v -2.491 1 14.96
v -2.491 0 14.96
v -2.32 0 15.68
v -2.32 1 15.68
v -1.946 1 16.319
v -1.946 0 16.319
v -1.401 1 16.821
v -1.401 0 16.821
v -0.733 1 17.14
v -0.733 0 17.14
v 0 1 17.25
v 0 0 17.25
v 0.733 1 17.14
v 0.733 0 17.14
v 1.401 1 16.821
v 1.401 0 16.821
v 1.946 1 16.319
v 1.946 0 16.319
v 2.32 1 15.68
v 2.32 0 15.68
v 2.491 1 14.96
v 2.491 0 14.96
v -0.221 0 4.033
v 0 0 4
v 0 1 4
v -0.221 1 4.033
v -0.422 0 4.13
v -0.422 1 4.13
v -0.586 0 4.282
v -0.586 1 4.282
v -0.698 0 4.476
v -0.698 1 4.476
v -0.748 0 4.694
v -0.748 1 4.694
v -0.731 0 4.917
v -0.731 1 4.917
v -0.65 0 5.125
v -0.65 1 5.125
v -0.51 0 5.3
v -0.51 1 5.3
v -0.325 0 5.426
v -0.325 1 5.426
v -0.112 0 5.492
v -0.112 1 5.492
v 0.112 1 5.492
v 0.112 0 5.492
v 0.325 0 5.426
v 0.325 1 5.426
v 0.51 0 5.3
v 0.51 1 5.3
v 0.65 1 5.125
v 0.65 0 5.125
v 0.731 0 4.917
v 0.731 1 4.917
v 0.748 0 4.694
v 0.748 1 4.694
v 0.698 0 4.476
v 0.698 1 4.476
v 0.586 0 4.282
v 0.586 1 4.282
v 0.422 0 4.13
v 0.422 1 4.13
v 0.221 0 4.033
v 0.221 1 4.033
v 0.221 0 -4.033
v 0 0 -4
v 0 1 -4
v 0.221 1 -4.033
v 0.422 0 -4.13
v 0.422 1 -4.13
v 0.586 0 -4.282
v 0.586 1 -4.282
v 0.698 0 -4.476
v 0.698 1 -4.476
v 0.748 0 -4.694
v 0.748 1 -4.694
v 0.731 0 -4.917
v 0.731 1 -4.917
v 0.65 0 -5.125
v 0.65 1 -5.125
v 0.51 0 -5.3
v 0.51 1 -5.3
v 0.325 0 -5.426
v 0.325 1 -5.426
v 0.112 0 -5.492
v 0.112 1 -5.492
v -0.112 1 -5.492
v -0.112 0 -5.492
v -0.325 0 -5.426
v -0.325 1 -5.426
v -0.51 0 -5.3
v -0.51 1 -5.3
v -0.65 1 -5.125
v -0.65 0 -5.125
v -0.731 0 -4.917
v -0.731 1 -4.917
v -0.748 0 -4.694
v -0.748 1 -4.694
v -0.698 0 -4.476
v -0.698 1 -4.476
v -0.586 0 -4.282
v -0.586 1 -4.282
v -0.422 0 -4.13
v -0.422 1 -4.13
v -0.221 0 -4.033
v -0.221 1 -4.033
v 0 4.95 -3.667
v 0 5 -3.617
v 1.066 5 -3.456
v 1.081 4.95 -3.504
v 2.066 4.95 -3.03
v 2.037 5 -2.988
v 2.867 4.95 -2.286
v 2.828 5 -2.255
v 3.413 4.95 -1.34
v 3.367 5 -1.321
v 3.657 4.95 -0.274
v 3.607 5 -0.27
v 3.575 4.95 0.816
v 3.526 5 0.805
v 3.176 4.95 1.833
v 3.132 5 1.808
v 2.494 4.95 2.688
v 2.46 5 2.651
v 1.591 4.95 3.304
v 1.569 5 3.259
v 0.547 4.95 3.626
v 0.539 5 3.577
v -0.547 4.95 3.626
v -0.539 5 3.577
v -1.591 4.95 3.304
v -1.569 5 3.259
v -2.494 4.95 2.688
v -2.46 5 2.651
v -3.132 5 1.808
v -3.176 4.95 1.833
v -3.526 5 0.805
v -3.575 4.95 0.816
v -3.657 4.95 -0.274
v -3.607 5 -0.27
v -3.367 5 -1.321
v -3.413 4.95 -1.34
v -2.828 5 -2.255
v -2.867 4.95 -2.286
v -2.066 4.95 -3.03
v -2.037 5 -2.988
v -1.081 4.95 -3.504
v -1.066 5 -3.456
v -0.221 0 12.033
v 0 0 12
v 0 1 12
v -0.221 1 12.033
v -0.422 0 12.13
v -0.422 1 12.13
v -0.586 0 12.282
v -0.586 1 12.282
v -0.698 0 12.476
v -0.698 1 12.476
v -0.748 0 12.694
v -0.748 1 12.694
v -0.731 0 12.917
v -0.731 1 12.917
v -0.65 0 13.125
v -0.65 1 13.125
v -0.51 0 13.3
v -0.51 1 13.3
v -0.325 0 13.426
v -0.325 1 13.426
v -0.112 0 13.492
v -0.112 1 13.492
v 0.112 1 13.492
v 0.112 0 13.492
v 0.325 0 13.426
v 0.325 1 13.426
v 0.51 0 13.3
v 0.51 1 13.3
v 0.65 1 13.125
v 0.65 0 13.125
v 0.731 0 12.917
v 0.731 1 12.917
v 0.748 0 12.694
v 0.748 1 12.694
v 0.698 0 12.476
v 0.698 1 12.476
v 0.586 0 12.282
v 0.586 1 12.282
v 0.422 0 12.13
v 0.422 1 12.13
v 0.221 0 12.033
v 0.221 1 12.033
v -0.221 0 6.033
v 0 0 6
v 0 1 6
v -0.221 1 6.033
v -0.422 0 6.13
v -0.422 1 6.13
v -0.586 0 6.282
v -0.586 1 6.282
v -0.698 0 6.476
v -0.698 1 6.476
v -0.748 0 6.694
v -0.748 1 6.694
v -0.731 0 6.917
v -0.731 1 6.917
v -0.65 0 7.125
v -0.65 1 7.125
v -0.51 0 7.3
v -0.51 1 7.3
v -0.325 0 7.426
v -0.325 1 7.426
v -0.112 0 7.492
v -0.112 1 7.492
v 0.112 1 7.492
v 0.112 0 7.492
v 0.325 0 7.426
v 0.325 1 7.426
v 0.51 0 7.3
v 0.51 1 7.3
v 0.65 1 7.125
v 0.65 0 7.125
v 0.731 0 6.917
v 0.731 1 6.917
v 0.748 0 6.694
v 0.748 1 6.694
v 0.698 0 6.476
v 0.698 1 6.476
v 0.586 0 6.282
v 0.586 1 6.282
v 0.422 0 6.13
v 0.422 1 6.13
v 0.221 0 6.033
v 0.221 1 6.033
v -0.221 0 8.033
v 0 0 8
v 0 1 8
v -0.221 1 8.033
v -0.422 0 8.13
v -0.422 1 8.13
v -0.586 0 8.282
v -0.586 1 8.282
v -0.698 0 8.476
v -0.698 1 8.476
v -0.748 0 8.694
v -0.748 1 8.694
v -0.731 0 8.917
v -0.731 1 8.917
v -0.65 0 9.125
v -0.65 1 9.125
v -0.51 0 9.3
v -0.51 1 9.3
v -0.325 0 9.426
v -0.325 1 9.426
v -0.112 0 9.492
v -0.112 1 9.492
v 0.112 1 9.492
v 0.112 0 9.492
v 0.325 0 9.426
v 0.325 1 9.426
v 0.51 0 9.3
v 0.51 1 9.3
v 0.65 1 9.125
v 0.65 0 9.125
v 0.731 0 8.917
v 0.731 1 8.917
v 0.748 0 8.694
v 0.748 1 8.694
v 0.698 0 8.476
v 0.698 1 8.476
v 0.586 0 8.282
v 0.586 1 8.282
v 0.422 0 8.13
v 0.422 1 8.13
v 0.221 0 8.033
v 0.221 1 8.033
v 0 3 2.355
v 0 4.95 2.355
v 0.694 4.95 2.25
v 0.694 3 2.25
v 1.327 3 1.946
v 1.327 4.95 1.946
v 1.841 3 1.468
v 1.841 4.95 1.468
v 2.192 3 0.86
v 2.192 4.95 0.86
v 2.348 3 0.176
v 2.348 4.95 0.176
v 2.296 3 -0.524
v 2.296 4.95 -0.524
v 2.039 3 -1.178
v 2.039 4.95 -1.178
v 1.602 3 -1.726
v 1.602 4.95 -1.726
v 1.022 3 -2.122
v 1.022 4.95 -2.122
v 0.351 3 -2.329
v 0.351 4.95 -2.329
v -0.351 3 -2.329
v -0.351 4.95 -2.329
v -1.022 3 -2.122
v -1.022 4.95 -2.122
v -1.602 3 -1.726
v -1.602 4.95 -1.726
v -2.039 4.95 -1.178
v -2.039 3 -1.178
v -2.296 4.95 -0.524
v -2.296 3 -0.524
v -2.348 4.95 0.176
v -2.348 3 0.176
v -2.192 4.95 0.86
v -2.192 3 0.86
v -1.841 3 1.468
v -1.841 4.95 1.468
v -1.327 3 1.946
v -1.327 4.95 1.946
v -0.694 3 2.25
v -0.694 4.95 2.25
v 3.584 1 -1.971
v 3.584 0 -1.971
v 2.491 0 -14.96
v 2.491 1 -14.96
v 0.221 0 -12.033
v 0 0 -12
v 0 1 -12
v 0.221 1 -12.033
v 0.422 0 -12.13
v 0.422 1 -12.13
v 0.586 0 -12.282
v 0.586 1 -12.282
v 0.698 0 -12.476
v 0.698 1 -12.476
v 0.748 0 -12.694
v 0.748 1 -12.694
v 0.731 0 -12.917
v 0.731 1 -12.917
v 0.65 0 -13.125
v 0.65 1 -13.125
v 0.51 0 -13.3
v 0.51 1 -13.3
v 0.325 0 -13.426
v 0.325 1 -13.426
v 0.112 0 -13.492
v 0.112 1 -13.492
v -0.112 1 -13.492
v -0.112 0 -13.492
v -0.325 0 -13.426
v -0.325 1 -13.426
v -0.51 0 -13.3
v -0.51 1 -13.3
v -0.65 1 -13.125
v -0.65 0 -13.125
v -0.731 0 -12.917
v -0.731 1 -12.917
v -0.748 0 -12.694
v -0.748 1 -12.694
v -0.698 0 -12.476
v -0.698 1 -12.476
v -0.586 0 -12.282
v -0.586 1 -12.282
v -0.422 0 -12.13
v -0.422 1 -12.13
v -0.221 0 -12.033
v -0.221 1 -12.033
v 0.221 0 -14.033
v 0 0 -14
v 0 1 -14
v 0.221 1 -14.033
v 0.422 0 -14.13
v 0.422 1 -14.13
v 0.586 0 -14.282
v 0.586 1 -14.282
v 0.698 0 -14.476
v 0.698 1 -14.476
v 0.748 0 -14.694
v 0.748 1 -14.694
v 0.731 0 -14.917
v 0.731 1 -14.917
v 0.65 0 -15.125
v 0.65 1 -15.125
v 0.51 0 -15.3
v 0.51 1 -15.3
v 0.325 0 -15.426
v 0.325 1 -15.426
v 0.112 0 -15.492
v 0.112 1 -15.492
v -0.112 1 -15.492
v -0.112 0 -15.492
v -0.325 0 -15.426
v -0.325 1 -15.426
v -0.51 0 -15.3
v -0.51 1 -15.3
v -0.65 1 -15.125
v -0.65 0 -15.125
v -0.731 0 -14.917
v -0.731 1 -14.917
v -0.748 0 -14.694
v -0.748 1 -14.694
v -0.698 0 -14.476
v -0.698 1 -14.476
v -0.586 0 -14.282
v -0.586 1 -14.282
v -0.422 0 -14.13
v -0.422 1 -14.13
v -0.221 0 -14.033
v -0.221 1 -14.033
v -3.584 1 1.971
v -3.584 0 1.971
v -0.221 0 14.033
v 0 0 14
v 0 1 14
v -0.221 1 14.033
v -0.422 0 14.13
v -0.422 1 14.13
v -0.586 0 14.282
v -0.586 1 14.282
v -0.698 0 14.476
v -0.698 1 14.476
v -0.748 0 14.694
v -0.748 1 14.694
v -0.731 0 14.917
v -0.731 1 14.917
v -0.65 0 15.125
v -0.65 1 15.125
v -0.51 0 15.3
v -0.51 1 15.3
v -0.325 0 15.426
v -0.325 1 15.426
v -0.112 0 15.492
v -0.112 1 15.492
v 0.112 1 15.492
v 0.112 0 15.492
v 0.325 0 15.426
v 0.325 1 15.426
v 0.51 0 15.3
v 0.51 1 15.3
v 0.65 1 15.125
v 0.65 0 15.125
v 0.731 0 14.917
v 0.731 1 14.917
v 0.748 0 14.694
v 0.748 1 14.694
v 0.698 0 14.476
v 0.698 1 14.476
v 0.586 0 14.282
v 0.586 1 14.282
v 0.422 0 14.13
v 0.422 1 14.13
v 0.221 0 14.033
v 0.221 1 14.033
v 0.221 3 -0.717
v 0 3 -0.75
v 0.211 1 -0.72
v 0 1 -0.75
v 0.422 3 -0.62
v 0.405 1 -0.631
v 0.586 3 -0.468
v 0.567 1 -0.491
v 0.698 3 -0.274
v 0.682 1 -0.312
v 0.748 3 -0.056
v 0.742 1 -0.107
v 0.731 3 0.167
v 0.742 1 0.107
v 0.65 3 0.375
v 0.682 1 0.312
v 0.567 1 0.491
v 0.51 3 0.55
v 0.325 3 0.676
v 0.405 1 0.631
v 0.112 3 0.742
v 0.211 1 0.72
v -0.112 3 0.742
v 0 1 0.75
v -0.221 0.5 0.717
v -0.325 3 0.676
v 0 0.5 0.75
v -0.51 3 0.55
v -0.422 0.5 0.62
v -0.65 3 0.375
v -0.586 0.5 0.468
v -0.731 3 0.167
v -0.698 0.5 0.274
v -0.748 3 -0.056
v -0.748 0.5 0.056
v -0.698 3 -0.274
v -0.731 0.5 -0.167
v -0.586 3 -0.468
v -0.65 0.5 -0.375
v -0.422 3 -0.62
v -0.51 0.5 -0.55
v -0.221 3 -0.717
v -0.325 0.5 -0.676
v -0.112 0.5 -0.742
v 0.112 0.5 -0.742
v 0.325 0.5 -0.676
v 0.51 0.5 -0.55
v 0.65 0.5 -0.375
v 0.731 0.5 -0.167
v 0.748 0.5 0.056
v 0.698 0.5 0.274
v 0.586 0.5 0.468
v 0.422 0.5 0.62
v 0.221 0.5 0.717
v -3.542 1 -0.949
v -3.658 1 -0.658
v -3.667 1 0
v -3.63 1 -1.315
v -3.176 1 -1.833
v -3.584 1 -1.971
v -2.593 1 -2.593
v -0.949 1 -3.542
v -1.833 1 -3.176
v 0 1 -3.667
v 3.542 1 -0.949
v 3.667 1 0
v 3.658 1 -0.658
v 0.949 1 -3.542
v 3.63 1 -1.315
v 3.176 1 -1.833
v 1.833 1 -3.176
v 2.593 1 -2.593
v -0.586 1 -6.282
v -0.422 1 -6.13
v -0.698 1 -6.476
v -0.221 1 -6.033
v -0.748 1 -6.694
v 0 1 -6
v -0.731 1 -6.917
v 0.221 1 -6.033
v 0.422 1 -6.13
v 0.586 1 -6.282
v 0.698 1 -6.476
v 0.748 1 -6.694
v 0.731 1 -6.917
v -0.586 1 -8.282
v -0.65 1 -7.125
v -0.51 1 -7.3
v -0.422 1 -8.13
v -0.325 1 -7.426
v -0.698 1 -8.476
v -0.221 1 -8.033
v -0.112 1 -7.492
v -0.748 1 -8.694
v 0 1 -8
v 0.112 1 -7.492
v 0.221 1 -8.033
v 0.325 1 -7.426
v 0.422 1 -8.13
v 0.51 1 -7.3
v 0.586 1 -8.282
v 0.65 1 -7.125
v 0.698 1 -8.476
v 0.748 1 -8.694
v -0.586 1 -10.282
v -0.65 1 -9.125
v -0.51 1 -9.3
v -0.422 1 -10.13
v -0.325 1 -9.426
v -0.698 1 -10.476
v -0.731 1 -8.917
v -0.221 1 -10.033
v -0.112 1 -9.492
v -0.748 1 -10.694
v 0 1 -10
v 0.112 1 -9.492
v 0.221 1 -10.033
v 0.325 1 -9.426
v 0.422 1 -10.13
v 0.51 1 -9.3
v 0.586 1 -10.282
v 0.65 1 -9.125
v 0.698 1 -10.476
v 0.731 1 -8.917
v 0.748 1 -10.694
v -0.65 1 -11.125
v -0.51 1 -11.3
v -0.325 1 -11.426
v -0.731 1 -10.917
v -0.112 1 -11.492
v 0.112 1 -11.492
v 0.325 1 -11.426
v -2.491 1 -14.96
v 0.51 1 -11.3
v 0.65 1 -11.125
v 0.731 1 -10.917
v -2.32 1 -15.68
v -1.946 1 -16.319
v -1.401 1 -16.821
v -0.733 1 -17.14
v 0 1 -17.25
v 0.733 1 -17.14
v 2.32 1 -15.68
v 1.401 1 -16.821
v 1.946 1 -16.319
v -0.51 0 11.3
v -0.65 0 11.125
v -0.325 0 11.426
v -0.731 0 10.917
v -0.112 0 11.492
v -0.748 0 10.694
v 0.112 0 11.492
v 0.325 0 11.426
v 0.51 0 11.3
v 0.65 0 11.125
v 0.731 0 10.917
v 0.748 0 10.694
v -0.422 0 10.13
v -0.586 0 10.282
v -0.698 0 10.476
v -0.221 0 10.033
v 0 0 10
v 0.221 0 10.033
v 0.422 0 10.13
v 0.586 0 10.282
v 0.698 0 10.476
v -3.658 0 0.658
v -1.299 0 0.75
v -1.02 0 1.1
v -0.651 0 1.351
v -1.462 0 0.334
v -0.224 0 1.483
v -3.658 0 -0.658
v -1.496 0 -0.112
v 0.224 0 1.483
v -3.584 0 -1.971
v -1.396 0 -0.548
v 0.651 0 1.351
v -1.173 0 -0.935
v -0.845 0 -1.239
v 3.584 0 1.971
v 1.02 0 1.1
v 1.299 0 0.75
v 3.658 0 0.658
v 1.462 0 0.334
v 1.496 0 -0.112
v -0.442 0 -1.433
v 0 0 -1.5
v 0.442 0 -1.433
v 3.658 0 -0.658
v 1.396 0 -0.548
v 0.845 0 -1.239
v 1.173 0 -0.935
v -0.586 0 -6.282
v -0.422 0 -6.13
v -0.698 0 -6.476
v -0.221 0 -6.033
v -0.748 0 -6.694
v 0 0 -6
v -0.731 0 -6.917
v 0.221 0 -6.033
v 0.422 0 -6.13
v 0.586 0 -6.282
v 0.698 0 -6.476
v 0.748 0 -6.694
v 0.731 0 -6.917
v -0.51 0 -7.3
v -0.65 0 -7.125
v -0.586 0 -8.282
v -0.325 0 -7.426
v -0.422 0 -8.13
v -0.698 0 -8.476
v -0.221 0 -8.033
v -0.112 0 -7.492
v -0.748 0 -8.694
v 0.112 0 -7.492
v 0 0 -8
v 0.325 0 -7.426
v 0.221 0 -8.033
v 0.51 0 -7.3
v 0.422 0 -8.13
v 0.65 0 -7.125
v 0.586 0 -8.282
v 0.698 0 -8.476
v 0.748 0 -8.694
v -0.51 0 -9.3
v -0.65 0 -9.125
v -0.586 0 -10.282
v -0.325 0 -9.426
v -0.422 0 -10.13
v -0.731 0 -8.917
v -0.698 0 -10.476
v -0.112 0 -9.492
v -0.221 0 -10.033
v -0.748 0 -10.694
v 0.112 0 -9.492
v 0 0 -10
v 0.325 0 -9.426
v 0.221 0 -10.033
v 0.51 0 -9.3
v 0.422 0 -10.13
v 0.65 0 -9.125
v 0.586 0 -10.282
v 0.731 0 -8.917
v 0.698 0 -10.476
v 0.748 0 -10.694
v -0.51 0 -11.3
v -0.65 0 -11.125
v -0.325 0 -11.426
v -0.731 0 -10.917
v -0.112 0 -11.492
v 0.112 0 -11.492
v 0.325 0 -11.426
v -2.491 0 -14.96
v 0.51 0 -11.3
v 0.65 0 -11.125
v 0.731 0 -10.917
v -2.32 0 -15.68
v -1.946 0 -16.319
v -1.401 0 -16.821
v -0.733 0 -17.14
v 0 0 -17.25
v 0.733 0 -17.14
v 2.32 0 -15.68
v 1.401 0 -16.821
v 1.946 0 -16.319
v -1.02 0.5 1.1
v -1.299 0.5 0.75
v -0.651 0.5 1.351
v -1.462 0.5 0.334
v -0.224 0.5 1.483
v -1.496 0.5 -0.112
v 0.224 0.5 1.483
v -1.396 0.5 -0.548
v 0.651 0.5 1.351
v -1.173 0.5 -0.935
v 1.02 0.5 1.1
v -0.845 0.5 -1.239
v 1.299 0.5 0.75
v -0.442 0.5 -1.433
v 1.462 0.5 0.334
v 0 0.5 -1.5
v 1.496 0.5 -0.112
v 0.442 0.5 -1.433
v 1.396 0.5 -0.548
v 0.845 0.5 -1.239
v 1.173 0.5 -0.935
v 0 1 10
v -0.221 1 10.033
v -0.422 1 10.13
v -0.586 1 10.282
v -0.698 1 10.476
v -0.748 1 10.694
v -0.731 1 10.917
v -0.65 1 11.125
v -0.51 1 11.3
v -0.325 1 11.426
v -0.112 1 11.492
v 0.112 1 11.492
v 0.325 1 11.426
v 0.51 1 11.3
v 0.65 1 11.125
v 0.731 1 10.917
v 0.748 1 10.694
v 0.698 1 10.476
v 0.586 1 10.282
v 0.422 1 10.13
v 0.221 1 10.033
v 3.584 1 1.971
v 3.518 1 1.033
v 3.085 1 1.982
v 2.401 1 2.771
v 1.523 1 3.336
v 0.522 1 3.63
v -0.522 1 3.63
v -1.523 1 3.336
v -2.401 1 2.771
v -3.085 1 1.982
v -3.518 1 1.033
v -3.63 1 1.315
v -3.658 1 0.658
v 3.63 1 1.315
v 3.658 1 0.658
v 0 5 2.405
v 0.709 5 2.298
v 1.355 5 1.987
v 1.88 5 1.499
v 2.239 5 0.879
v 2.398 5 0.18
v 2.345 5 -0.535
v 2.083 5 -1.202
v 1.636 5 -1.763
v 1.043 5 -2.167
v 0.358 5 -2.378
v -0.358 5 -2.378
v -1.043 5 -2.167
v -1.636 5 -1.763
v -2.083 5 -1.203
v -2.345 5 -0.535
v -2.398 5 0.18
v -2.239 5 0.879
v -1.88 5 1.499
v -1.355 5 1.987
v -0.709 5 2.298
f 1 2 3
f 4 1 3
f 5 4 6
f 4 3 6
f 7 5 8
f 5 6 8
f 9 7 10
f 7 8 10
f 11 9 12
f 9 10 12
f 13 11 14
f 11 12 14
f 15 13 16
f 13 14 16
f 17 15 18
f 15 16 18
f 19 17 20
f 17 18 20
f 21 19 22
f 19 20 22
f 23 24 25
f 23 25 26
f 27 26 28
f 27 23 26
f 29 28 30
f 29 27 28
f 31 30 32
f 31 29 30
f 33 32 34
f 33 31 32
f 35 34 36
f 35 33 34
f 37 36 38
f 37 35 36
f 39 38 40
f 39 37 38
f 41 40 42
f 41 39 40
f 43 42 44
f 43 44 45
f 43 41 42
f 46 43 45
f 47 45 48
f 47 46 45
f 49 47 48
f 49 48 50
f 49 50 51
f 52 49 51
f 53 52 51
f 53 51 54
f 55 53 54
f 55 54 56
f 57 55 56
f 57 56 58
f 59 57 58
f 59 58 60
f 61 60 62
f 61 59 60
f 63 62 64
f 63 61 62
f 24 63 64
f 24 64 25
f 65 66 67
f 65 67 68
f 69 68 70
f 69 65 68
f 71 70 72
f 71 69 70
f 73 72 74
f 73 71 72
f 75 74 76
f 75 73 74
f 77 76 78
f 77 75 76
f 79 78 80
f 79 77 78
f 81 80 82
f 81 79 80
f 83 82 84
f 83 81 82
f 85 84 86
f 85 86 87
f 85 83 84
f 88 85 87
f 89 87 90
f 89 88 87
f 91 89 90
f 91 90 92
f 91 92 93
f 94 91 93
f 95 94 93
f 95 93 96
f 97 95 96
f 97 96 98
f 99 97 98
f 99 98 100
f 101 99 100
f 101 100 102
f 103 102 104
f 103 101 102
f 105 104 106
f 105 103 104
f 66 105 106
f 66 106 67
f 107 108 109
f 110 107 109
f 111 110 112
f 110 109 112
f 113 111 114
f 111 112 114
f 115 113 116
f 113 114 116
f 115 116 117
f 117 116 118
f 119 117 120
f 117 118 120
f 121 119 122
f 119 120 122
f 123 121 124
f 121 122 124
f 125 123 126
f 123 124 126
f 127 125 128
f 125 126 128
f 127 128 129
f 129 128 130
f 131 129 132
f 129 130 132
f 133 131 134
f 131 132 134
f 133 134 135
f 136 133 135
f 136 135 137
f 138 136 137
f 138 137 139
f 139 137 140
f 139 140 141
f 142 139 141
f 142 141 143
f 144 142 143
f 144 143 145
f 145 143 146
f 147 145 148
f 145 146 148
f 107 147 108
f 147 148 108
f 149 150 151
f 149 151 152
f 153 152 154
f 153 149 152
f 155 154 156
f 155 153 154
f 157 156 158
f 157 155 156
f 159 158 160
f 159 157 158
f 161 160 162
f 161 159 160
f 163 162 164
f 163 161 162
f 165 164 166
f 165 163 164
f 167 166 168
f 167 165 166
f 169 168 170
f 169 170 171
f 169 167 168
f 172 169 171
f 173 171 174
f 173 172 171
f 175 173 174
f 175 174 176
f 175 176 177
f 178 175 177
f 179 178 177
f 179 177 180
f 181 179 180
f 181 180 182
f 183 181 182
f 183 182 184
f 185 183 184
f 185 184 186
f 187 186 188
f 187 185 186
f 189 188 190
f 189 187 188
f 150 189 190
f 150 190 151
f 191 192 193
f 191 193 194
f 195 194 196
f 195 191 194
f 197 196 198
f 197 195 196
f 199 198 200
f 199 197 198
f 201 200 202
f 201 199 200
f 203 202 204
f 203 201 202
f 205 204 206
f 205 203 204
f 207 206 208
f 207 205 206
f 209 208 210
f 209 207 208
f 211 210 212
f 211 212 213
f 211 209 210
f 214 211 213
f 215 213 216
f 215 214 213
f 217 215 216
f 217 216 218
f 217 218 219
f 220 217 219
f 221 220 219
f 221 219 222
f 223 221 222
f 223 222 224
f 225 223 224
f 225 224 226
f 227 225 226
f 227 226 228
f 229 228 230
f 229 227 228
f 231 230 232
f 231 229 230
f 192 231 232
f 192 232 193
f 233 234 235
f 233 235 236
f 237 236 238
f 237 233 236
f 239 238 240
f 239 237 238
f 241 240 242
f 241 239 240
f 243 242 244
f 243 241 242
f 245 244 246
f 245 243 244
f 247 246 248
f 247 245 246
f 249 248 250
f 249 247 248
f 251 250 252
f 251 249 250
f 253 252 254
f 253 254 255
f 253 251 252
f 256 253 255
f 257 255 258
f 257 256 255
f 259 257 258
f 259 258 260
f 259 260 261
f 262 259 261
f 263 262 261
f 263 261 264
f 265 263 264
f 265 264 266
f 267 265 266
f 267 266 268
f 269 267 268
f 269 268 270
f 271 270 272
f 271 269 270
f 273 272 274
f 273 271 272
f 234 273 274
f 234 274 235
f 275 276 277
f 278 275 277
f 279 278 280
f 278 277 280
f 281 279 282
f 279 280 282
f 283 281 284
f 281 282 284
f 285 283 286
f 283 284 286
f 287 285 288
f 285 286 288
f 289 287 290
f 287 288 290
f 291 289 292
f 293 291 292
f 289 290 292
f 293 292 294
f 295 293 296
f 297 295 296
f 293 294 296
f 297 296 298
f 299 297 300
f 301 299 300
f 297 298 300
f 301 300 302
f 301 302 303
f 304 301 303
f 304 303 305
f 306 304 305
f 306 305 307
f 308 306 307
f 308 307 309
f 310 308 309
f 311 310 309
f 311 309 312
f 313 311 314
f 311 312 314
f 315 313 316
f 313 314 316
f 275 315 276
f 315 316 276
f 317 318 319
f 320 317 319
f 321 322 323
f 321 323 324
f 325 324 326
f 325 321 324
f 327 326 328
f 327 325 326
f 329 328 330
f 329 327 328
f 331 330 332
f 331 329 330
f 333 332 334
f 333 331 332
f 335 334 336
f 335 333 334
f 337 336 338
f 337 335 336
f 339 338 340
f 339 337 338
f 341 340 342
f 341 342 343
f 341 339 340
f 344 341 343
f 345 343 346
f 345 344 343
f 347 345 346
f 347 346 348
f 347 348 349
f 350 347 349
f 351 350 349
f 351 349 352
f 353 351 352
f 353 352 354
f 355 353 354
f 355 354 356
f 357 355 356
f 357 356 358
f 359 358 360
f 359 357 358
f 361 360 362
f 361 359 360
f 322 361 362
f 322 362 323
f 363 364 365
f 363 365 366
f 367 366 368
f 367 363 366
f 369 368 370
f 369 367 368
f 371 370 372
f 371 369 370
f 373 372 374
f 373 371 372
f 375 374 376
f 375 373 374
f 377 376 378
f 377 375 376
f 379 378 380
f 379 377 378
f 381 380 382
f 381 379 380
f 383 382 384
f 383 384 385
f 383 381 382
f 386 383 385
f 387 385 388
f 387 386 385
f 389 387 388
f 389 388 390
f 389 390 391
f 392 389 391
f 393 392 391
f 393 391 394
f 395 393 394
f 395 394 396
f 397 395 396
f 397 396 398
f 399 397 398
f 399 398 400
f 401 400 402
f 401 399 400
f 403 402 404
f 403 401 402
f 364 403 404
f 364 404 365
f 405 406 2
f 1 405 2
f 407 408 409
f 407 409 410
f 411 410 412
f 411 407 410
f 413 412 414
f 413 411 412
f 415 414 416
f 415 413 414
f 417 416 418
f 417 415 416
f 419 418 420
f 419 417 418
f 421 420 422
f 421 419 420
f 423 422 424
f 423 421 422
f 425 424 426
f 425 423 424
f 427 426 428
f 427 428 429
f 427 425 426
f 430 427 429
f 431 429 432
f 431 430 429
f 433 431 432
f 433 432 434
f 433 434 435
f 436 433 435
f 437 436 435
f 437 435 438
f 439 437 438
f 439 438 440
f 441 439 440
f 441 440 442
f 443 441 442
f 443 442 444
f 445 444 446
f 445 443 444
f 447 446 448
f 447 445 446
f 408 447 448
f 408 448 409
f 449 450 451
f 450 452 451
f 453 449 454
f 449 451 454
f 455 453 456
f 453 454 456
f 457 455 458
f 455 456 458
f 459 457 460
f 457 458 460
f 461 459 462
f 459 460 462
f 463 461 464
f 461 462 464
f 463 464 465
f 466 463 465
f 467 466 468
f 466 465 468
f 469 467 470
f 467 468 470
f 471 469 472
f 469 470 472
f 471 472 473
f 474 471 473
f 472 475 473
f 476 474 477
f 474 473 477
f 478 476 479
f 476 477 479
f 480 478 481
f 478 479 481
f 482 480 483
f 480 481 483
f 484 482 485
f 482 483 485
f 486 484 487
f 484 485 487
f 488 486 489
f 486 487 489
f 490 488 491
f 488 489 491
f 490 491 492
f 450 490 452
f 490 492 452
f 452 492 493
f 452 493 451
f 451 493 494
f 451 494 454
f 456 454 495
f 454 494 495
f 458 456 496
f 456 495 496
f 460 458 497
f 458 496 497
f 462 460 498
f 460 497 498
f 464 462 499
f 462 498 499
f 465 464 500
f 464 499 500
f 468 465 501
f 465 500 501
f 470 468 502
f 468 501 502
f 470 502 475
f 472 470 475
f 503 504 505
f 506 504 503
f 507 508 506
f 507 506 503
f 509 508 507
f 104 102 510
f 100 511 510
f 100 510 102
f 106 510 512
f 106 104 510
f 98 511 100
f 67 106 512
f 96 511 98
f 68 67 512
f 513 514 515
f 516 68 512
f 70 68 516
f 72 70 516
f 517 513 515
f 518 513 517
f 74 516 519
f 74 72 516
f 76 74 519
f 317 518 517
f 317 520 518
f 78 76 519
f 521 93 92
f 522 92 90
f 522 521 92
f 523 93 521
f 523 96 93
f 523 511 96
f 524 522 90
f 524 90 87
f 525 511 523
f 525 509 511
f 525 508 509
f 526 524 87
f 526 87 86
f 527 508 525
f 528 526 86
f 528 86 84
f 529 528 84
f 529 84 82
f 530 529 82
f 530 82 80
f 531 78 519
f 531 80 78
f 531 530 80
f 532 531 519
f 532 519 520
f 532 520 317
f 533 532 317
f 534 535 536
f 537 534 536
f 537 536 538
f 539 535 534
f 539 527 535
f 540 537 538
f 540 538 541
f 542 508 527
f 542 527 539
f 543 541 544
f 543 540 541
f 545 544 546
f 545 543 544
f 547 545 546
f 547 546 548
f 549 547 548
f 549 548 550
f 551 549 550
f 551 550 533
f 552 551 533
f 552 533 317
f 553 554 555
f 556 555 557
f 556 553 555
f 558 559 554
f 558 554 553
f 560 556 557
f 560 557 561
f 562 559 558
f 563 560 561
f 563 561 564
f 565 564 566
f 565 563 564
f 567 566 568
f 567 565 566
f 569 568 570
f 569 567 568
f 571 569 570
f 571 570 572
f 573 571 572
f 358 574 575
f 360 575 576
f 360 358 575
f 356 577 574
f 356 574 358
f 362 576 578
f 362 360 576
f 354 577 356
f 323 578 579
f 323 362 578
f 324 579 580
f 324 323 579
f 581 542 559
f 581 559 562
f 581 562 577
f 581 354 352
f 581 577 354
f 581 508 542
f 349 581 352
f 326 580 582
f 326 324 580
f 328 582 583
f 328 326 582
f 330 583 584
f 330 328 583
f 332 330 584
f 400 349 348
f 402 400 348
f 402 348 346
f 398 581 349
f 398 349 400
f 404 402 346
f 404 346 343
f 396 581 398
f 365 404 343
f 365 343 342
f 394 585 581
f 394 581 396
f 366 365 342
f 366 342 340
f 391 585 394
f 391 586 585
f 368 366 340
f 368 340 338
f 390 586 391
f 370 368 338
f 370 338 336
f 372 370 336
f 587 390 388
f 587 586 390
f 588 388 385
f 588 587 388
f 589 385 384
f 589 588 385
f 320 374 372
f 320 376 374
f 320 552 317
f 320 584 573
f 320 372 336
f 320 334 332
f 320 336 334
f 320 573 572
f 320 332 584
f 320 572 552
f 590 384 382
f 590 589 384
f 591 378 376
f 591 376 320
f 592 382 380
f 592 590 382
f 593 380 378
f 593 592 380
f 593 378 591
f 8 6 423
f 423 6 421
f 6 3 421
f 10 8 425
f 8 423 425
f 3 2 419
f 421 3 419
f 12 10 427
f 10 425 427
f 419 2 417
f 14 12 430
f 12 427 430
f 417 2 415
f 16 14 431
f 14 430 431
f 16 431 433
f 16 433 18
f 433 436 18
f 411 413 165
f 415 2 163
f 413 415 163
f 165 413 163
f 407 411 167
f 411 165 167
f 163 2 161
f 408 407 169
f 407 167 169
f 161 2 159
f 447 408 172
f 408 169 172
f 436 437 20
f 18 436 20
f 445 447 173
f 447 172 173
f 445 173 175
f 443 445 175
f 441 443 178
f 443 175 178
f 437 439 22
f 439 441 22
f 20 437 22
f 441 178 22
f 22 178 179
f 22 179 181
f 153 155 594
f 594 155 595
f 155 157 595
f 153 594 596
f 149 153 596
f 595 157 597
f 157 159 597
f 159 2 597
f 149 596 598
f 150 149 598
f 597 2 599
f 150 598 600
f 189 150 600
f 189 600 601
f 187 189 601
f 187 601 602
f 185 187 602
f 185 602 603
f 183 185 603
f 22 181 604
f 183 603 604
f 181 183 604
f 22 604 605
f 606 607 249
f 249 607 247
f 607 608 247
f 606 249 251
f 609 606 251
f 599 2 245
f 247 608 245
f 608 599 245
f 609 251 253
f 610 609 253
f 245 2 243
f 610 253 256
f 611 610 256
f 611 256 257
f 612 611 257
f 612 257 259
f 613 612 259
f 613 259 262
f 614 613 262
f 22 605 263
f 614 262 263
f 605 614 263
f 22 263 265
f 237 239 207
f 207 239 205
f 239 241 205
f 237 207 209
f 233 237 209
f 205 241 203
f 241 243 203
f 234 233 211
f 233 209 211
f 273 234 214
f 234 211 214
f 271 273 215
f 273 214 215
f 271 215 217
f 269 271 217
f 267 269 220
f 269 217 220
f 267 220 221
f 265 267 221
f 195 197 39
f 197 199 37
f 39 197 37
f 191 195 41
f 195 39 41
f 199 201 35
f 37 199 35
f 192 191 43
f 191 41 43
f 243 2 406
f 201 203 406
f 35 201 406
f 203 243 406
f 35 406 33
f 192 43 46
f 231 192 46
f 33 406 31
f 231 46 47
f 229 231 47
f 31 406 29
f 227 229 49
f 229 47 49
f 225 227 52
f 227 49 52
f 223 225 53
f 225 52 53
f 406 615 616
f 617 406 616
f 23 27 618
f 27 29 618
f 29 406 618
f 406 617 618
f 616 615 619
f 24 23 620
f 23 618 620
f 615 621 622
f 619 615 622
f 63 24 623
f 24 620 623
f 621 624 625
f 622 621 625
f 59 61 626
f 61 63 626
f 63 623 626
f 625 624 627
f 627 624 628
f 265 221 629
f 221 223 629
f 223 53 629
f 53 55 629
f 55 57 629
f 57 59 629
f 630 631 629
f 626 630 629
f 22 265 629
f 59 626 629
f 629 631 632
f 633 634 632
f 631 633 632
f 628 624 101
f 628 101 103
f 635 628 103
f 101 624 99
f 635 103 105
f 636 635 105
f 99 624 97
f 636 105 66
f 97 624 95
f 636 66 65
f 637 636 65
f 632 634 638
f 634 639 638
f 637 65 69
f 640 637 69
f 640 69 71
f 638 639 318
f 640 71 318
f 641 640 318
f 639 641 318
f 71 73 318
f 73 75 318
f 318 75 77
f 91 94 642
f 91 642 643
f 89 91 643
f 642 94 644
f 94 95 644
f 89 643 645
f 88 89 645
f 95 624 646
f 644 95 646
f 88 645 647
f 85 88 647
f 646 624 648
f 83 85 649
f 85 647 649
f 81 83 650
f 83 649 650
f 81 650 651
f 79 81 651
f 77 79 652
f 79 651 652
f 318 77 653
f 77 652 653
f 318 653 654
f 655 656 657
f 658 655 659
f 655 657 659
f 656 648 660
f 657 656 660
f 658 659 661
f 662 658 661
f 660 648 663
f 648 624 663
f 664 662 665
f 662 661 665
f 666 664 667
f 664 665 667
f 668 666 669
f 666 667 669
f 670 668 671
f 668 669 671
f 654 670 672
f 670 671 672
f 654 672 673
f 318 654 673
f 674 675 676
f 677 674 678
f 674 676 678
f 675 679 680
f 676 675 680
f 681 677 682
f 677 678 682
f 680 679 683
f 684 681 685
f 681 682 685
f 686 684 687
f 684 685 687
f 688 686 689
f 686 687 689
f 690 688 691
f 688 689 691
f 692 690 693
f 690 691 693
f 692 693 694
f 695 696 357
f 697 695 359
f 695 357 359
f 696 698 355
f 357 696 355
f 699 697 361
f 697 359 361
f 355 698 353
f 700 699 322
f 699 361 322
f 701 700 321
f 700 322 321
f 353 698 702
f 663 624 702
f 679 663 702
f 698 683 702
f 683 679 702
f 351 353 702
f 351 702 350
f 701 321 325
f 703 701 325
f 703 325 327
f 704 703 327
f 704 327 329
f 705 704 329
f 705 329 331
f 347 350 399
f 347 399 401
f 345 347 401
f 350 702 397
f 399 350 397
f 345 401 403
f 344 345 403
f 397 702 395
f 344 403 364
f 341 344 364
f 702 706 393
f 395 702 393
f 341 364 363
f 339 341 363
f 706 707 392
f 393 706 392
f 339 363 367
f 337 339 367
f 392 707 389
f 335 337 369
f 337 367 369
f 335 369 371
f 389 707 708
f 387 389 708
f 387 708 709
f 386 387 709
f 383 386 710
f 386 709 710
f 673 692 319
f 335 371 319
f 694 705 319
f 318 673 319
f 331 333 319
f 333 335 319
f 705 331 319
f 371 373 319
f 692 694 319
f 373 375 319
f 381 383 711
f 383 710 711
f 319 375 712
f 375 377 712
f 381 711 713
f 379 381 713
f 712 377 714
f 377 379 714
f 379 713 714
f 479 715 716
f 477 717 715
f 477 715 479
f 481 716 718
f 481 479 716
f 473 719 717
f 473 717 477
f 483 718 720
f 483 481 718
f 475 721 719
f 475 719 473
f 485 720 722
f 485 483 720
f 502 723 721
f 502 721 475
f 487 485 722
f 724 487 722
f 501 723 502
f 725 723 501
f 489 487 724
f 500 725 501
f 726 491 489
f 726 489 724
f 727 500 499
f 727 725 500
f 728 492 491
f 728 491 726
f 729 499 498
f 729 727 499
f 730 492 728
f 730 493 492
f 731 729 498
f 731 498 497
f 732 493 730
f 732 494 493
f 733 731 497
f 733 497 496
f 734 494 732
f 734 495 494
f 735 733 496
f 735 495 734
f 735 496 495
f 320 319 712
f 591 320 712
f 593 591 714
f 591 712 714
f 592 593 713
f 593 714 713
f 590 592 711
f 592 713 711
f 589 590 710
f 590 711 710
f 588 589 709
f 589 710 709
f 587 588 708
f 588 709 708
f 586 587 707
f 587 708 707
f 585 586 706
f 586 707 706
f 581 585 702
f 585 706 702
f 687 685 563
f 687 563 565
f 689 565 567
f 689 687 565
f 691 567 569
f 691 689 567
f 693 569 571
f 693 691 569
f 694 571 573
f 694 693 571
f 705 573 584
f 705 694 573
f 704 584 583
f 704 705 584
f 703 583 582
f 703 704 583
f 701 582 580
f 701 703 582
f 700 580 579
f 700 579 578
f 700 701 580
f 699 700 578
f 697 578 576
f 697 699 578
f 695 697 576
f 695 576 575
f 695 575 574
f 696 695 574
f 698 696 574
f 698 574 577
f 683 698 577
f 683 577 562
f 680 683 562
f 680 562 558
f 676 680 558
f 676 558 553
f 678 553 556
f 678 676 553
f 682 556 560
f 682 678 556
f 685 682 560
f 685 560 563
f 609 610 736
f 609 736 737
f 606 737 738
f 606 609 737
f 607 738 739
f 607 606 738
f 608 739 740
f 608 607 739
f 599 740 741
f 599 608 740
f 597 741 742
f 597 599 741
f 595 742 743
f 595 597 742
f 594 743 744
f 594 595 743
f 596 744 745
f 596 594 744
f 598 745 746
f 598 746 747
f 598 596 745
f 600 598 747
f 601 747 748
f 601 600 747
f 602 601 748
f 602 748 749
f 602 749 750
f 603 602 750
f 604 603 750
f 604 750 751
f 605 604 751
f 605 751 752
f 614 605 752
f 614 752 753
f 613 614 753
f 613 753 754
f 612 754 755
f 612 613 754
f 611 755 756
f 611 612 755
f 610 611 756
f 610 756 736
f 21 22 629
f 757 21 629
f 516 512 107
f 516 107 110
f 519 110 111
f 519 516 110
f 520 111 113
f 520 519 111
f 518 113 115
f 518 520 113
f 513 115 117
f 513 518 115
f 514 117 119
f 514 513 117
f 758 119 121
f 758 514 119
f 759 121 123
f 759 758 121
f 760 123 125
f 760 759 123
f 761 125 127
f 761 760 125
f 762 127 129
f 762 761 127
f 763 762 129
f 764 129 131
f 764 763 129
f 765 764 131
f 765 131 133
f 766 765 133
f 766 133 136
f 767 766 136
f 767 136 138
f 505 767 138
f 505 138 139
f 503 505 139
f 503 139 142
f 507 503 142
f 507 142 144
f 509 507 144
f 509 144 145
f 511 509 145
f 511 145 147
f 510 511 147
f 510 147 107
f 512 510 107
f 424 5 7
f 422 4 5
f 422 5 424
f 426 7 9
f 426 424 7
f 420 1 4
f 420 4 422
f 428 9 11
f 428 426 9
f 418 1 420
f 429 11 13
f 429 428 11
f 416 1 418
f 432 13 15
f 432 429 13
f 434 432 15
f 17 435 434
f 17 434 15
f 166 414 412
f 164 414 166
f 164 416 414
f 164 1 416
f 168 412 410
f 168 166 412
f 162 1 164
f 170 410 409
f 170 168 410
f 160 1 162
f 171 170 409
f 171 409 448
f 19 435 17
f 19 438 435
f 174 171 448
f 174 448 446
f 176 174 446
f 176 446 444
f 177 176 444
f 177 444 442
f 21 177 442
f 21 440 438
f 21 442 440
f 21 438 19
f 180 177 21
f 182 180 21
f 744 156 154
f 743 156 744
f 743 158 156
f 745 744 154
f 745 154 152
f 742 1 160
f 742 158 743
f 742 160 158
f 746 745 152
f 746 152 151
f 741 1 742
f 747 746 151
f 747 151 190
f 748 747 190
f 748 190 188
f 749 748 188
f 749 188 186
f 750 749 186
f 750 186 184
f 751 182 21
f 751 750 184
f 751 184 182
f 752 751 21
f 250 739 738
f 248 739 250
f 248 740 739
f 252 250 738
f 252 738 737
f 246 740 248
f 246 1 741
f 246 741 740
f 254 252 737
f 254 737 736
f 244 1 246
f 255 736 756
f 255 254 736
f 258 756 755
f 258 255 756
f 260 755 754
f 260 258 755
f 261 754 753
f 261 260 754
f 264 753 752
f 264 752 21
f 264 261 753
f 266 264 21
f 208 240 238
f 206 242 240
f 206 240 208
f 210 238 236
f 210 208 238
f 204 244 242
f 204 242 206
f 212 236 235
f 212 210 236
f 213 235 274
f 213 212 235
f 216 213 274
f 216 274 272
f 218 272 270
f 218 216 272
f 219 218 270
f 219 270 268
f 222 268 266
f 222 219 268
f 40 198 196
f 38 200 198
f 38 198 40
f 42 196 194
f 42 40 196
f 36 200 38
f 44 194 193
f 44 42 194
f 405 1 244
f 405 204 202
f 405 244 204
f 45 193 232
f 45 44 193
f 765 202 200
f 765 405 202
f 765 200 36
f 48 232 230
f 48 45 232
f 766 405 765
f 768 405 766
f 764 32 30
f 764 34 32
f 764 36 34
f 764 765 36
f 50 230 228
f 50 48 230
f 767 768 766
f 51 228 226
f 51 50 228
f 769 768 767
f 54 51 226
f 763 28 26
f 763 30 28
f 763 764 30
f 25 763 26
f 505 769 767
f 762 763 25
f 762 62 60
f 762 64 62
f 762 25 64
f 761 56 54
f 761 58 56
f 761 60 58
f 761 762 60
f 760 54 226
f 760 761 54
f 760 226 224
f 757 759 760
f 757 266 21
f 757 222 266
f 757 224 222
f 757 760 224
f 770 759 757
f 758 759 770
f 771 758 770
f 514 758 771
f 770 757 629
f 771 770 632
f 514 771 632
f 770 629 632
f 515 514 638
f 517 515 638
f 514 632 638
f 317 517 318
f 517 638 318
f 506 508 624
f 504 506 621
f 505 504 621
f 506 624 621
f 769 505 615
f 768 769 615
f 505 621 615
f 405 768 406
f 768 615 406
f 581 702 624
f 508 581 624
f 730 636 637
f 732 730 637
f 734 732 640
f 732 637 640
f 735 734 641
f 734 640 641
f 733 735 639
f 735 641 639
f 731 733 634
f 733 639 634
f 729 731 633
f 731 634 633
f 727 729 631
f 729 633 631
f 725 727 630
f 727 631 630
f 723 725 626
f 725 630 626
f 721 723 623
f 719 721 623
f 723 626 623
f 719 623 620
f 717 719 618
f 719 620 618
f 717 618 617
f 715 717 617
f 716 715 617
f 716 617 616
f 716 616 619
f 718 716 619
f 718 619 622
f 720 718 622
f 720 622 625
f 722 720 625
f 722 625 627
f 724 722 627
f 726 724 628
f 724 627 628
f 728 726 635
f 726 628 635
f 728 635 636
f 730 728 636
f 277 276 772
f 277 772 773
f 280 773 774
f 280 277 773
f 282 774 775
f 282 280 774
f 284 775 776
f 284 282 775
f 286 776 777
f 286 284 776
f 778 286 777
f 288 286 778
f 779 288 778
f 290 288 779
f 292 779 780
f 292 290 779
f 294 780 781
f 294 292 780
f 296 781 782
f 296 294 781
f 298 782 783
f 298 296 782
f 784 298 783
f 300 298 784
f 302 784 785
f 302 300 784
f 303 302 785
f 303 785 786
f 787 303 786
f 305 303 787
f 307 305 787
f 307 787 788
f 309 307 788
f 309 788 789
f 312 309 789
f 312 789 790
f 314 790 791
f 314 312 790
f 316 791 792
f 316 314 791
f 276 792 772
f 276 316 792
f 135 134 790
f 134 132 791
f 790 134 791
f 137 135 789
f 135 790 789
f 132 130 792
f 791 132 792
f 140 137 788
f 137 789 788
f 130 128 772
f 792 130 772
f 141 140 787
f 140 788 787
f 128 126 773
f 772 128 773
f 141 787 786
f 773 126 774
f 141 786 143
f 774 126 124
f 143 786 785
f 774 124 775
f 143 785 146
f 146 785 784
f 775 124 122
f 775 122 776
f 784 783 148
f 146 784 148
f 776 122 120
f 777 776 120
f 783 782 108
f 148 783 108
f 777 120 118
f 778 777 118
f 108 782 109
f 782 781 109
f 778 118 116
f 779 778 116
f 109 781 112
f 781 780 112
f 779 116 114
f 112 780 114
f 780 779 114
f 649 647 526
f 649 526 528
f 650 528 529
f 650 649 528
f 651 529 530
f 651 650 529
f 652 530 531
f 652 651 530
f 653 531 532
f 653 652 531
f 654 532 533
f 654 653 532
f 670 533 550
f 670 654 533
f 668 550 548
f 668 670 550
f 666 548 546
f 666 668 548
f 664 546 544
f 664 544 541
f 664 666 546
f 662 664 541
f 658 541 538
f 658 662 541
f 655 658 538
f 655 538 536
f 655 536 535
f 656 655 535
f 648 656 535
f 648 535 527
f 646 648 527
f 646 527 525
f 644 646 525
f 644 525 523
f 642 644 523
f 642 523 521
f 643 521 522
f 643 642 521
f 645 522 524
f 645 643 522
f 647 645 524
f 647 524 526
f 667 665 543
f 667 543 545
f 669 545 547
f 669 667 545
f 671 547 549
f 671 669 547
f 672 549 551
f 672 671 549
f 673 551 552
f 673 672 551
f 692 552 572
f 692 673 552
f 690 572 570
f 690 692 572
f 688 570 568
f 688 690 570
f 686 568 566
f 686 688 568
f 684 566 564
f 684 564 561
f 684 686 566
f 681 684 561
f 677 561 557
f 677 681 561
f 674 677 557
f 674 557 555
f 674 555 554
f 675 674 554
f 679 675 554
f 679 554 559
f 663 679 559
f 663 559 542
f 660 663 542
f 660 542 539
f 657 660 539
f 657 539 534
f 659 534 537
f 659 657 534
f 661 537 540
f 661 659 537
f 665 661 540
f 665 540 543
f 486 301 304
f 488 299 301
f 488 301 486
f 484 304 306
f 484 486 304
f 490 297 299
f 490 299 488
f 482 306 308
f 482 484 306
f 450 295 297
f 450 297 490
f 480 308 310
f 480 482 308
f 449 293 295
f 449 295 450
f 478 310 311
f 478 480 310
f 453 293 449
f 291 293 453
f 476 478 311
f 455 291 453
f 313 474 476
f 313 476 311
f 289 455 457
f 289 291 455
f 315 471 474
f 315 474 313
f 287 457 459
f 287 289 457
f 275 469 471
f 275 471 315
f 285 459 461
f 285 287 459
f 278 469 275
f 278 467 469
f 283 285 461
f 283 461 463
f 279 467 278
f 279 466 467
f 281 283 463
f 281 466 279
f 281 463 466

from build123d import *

# Parameters (mm, degrees)
SKETCH1_R           = 0.75
BOSS_EXTRUDE1_DEPTH = 1
SKETCH2_R           = 3.666938222
SKETCH2_R_2         = 0.75
BOSS_EXTRUDE2_DEPTH = 5
SKETCH2_2_R         = 1.5
CUT_EXTRUDE1_DEPTH  = 0.5
SKETCH3_R           = 2.355
CUT_EXTRUDE2_DEPTH  = 2
CHAMFER1_SIZE       = 0.05


with BuildPart() as part:
    # Sketch1 → Boss-Extrude1 (new body)
    with BuildSketch(Plane(origin=(0, 0, 0), x_dir=(1, 0, 0), z_dir=(0, 1, 0))):
        with BuildLine():
            Line((-2.49119588, 14.959626071), (-3.584168958, 1.970735827))
            ThreePointArc((-3.584168958, 1.970735827), (-3.666938222, 0), (-3.584168958, -1.970735827))
            Line((-3.584168958, -1.970735827), (-2.49119588, -14.959626071))
            ThreePointArc((-2.49119588, -14.959626071), (0, -17.25), (2.49119588, -14.959626071))
            Line((2.49119588, -14.959626071), (3.584168958, -1.970735827))
            ThreePointArc((3.584168958, -1.970735827), (3.666938222, 0), (3.584168958, 1.970735827))
            Line((3.584168958, 1.970735827), (2.49119588, 14.959626071))
            ThreePointArc((2.49119588, 14.959626071), (0, 17.25), (-2.49119588, 14.959626071))
        make_face()
        with Locations((0, 14.75)):
            Circle(SKETCH1_R, mode=Mode.SUBTRACT)
        with Locations((0, 12.75)):
            Circle(SKETCH1_R, mode=Mode.SUBTRACT)
        with Locations((0, 10.75)):
            Circle(SKETCH1_R, mode=Mode.SUBTRACT)
        with Locations((0, 8.75)):
            Circle(SKETCH1_R, mode=Mode.SUBTRACT)
        with Locations((0, 6.75)):
            Circle(SKETCH1_R, mode=Mode.SUBTRACT)
        with Locations((0, 4.75)):
            Circle(SKETCH1_R, mode=Mode.SUBTRACT)
        Circle(SKETCH1_R, mode=Mode.SUBTRACT)
        with Locations((0, -14.75)):
            Circle(SKETCH1_R, mode=Mode.SUBTRACT)
        with Locations((0, -12.75)):
            Circle(SKETCH1_R, mode=Mode.SUBTRACT)
        with Locations((0, -10.75)):
            Circle(SKETCH1_R, mode=Mode.SUBTRACT)
        with Locations((0, -8.75)):
            Circle(SKETCH1_R, mode=Mode.SUBTRACT)
        with Locations((0, -6.75)):
            Circle(SKETCH1_R, mode=Mode.SUBTRACT)
        with Locations((0, -4.75)):
            Circle(SKETCH1_R, mode=Mode.SUBTRACT)
    extrude(amount=BOSS_EXTRUDE1_DEPTH)

    # Sketch2 → Boss-Extrude2 (add)
    with BuildSketch(Plane.XZ):
        Circle(SKETCH2_R)
        Circle(SKETCH2_R_2, mode=Mode.SUBTRACT)
    extrude(amount=-BOSS_EXTRUDE2_DEPTH)

    # Sketch2<2> → Cut-Extrude1 (cut)
    with BuildSketch(Plane.XZ):
        Circle(SKETCH2_2_R)
    extrude(amount=-CUT_EXTRUDE1_DEPTH, mode=Mode.SUBTRACT)

    # Sketch3 → Cut-Extrude2 (cut)
    with BuildSketch(Plane(origin=(0, 5, 0), x_dir=(1, 0, 0), z_dir=(0, 1, 0))):
        Circle(SKETCH3_R)
    extrude(amount=-CUT_EXTRUDE2_DEPTH, mode=Mode.SUBTRACT)

    # Chamfer1
    chamfer1_edges = [part.edges().sort_by_distance(p)[0] for p in [
        (-3.666938222, 5, 0),
        (-2.355, 5, 0),
    ]]
    chamfer(chamfer1_edges, length=CHAMFER1_SIZE)


solid = part.part
